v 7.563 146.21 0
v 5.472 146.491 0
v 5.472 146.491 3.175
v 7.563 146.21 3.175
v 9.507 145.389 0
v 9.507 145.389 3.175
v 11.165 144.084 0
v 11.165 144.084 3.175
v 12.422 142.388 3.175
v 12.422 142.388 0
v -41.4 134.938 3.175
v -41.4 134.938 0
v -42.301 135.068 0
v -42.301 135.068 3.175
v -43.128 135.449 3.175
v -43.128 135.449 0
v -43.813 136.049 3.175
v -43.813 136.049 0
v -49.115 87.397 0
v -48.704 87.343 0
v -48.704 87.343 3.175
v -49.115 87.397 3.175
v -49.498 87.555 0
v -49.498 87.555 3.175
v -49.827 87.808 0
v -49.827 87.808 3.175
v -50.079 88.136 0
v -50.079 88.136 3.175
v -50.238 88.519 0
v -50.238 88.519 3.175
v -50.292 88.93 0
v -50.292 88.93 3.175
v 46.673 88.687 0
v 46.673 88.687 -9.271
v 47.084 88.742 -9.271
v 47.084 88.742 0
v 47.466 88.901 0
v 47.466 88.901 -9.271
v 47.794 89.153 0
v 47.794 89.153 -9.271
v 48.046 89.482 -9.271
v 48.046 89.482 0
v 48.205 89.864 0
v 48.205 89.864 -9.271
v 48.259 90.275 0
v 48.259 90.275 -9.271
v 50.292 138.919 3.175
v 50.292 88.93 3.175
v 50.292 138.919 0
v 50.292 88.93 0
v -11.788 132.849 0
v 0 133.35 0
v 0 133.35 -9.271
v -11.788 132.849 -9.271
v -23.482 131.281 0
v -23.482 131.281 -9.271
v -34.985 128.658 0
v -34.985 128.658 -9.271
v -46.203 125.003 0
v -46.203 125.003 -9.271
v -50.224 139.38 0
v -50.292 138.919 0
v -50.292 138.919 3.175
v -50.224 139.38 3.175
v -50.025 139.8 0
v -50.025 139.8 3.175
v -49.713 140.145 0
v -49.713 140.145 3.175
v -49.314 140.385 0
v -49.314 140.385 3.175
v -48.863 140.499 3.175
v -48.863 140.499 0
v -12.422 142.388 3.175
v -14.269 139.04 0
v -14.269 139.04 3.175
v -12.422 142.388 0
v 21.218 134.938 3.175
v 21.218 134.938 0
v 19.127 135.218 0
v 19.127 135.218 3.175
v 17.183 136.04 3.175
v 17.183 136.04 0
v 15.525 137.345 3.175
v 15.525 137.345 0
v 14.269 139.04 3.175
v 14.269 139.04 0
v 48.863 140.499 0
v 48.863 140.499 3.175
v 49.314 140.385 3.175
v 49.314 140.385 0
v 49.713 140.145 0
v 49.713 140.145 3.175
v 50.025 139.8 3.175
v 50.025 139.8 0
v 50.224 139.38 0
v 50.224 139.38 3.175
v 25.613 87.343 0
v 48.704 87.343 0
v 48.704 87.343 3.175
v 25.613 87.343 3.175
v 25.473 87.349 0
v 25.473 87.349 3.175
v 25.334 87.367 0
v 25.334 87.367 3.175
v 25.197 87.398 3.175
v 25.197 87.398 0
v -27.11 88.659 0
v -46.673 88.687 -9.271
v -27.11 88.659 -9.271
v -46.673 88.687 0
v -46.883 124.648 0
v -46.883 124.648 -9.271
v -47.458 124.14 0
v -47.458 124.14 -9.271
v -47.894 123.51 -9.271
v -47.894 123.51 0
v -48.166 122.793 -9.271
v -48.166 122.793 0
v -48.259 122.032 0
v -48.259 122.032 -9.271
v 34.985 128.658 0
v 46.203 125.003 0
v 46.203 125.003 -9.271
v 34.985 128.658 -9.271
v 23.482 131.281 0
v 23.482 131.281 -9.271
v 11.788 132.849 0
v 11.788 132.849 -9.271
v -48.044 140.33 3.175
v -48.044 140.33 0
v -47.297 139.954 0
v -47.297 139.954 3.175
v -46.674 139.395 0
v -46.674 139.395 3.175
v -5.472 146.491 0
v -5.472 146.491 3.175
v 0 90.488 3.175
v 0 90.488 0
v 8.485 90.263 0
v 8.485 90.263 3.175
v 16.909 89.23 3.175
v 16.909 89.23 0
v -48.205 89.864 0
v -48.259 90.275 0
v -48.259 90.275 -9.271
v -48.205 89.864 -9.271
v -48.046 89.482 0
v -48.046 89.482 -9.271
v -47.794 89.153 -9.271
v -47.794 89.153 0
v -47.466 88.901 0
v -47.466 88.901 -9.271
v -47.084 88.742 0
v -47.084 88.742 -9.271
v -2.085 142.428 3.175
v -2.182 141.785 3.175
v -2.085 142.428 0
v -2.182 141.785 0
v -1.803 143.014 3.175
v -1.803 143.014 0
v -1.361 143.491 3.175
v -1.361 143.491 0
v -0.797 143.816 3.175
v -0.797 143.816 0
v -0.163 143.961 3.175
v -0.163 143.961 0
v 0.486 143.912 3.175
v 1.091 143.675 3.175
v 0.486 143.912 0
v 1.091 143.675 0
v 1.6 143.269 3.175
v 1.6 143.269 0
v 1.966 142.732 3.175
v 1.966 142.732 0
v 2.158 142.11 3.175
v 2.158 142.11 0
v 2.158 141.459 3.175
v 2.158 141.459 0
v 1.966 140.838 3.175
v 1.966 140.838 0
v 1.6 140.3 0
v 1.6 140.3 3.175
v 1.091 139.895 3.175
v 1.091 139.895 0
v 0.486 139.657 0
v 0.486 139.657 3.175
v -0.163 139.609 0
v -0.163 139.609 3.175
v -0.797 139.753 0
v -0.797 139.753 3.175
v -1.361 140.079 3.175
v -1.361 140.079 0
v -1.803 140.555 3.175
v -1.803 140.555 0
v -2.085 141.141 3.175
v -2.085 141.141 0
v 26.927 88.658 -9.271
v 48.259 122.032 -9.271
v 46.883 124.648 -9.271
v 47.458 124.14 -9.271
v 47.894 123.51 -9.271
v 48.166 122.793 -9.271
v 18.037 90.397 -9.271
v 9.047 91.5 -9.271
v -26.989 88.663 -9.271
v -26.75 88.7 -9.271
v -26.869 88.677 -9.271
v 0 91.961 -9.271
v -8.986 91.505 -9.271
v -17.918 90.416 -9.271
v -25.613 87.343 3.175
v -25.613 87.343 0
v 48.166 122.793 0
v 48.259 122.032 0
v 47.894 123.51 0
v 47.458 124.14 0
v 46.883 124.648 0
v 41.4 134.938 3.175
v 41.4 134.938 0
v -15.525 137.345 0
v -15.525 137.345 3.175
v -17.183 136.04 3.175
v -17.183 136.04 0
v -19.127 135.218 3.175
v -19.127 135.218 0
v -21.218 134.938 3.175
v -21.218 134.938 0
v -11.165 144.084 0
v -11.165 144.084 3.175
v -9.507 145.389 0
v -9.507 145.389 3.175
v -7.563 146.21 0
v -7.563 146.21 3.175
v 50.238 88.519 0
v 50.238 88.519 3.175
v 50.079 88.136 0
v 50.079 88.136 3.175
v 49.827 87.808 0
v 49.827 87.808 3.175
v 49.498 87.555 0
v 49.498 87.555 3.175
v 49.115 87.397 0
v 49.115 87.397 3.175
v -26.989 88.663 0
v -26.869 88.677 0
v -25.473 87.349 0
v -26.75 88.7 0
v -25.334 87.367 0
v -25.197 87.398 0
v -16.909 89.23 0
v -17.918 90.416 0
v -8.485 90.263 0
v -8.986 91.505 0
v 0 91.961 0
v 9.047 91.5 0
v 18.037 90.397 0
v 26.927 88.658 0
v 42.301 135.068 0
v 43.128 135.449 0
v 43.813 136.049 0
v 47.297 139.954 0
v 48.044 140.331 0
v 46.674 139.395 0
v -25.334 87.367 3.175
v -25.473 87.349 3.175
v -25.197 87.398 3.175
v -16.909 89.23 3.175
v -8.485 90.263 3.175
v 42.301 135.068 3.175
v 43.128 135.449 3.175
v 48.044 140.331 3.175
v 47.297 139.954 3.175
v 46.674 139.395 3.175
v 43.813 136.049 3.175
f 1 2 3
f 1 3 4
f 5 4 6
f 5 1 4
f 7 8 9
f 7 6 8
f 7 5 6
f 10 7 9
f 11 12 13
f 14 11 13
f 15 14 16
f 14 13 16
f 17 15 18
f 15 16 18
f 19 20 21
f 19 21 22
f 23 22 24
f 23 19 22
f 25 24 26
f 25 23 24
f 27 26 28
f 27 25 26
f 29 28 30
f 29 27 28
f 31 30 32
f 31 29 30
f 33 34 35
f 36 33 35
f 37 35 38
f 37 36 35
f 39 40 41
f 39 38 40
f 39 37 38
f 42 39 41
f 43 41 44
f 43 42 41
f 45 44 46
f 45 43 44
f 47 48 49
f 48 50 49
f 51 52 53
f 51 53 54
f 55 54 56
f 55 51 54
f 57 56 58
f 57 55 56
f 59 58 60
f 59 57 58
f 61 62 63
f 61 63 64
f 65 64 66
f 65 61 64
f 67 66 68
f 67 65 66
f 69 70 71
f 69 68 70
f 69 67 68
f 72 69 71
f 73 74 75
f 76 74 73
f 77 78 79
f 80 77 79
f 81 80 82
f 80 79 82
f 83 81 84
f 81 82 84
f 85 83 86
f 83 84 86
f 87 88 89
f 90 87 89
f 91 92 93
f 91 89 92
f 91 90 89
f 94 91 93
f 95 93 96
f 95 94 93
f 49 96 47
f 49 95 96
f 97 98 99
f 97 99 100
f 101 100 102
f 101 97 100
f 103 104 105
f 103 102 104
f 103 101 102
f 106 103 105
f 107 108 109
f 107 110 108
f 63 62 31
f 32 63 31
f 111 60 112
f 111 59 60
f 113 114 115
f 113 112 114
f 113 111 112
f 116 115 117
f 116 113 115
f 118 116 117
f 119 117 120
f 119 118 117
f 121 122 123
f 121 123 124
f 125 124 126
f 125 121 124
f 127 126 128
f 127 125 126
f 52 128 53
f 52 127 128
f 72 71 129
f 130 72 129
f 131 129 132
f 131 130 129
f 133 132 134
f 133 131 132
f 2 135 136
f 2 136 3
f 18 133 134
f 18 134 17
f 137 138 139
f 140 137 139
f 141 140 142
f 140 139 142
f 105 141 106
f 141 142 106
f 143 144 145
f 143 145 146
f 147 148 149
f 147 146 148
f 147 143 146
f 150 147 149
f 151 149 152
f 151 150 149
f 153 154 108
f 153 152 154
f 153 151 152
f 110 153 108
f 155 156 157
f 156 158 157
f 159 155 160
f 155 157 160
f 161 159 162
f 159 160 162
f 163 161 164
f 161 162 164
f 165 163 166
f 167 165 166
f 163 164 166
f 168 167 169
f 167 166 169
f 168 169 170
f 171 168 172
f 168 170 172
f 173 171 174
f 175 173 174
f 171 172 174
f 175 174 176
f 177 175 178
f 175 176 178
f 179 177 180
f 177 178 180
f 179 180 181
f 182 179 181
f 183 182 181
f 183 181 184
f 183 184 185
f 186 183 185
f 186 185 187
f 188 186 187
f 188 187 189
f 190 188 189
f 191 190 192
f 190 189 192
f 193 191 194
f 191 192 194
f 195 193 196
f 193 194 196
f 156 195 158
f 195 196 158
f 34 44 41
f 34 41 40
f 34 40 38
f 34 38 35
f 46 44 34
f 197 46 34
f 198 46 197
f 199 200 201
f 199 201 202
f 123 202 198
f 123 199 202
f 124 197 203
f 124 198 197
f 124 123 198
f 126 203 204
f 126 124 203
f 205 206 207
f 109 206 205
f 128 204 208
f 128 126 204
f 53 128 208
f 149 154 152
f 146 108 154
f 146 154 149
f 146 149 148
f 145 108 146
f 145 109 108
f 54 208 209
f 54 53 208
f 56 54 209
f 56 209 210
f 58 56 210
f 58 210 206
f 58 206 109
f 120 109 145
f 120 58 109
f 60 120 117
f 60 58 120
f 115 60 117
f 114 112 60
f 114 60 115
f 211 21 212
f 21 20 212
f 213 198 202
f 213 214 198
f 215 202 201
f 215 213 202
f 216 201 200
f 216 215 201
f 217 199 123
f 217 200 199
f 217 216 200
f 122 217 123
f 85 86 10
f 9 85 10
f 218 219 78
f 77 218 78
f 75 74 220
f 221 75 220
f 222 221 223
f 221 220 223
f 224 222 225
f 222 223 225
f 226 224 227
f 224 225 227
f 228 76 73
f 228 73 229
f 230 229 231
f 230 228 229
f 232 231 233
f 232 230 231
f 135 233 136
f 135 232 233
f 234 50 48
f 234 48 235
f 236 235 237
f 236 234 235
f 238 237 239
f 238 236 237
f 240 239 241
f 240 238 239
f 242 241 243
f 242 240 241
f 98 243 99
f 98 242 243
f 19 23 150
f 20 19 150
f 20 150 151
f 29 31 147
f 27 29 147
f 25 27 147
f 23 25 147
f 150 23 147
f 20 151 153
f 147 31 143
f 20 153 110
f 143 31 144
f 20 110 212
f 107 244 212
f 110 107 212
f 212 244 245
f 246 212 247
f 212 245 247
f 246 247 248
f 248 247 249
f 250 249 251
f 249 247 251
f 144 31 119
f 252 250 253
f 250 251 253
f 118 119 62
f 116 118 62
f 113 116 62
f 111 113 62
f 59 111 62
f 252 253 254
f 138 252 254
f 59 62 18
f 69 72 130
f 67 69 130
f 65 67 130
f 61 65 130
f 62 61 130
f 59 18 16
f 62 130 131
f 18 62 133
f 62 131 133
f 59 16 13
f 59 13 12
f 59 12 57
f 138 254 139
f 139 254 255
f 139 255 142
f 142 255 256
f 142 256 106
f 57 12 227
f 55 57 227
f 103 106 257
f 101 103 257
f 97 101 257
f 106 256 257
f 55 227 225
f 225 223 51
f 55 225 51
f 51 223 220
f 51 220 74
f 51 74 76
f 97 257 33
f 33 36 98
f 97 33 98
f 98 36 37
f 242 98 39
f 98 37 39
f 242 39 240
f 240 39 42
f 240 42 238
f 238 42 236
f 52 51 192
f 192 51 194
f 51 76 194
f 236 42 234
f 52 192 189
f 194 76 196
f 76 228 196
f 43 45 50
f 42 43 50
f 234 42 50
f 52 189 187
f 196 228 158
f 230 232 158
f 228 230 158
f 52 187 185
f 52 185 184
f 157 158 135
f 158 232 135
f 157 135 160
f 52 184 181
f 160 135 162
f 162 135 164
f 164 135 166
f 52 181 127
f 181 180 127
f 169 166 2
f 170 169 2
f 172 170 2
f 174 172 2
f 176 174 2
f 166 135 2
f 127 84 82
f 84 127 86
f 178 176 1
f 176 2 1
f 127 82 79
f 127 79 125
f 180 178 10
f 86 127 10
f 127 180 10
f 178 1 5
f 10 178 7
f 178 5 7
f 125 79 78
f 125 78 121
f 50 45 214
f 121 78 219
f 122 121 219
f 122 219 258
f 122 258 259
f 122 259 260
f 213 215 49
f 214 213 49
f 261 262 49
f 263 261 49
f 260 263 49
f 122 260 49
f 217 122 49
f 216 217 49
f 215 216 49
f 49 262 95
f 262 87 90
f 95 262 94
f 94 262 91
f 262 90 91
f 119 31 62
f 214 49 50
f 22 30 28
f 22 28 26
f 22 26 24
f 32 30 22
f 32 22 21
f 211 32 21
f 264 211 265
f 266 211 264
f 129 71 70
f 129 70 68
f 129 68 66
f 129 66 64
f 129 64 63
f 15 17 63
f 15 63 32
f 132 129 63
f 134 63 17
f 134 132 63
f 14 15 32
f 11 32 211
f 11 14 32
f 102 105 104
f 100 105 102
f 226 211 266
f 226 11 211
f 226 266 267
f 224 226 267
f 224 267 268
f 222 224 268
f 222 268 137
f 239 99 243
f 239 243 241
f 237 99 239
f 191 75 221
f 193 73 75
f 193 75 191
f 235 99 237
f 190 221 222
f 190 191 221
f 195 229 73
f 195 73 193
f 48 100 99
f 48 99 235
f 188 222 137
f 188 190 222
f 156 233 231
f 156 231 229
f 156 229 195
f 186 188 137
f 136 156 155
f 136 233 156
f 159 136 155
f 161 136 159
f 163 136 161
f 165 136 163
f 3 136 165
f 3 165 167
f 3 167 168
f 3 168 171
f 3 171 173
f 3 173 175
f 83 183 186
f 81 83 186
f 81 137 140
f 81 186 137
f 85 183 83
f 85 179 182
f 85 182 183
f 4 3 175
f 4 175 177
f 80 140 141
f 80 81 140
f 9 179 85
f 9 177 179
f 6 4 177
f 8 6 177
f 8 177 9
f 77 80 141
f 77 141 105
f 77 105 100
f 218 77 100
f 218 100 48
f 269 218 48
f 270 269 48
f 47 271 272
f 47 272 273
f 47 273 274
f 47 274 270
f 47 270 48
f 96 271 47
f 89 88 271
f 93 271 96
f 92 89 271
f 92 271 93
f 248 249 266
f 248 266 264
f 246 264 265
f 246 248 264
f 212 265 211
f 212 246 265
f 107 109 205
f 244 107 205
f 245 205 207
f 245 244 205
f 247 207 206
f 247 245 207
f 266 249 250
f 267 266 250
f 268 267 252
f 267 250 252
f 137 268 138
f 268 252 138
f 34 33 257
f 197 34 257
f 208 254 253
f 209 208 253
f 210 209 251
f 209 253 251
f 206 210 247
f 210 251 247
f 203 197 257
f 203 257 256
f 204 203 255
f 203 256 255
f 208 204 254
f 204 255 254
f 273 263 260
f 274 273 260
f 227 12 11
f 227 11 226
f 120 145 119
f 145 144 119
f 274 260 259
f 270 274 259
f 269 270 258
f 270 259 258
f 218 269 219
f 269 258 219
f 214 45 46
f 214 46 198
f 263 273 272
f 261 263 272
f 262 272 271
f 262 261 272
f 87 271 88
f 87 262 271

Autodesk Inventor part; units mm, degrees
ref_plane "YZ Plane" through (0, 0, 0) normal (1, 0, 0) x (0, 1, 0)
ref_plane "XZ Plane" through (0, 0, 0) normal (0, 1, 0) x (-1, 0, 0)
ref_plane "XY Plane" through (0, 0, 0) normal (0, 0, 1) x (1, 0, 0)
sketch "Esquisse1" plane through (0, 0, 0) normal (0, 0, 1) x (1, 0, 0)
  line L0 (-186.69, 0) -> (186.69, 0) projected
  line L1 (0, -197.485) -> (0, 251.46) projected
  circle A0 centre (0, 0) radius 133.35 construction
  line L2 (-50.292, 138.9194) -> (-50.292, 88.9302)
  line L3 (50.292, 88.9302) -> (50.292, 138.9194)
  line L4 (-5.4717, 146.4909) -> (0, 146.4909)
  line L5 (-59.3639, 174.3189) -> (62.2899, 174.3189) construction
  line L6 (62.2899, 174.3189) -> (62.2899, 74.4875) construction
  line L7 (62.2899, 74.4875) -> (-59.3639, 74.4875) construction
  line L8 (-59.3639, 74.4875) -> (-59.3639, 174.3189) construction
  line L9 (-46.6745, 139.3954) -> (-43.813, 136.0491)
  line L10 (-41.4, 134.9375) -> (-21.2184, 134.9375)
  line L11 (-14.2687, 139.0403) -> (-12.4215, 142.3881)
  line L12 (0, 14.2875) -> (0, 187.325) construction
  arc A1 (-46.6745, 139.3954) -> (-48.8631, 140.499) centre (-49.0875, 137.3319) ccw
  arc A2 (-43.813, 136.0491) -> (-41.4, 134.9375) centre (-41.4, 138.1125) ccw
  arc A3 (-48.8631, 140.499) -> (-50.292, 138.9194) centre (-48.7045, 138.9194) ccw
  arc A4 (-21.2184, 134.9375) -> (-14.2687, 139.0403) centre (-21.2184, 142.875) ccw
  arc A5 (-5.4717, 146.4909) -> (-12.4215, 142.3881) centre (-5.4717, 138.5534) ccw
  line L13 (5.4717, 146.4909) -> (0, 146.4909)
  line L14 (46.6745, 139.3954) -> (43.813, 136.0491)
  line L15 (41.4, 134.9375) -> (21.2184, 134.9375)
  line L16 (14.2687, 139.0403) -> (12.4215, 142.3881)
  arc A6 (48.8631, 140.499) -> (46.6745, 139.3954) centre (49.0875, 137.3319) ccw
  arc A7 (41.4, 134.9375) -> (43.813, 136.0491) centre (41.4, 138.1125) ccw
  arc A8 (50.292, 138.9194) -> (48.8631, 140.499) centre (48.7045, 138.9194) ccw
  arc A9 (14.2687, 139.0403) -> (21.2184, 134.9375) centre (21.2184, 142.875) ccw
  arc A10 (12.4215, 142.3881) -> (5.4717, 146.4909) centre (5.4717, 138.5534) ccw
  line L17 (-48.7045, 87.3427) -> (-25.6128, 87.3427)
  arc A11 (0, 90.4875) -> (-25.1966, 87.3982) centre (-1.8902, 1.6076) ccw
  arc A12 (-50.292, 88.9302) -> (-48.7045, 87.3427) centre (-48.7045, 88.9302) ccw
  arc A13 (-25.6128, 87.3427) -> (-25.1966, 87.3982) centre (-25.6128, 88.9302) ccw
  line L18 (48.7045, 87.3427) -> (25.6128, 87.3427)
  arc A14 (25.1966, 87.3982) -> (0, 90.4875) centre (1.8902, 1.6076) ccw
  arc A15 (25.1966, 87.3982) -> (25.6128, 87.3427) centre (25.6128, 88.9302) ccw
  arc A16 (48.7045, 87.3427) -> (50.292, 88.9302) centre (48.7045, 88.9302) ccw
  point P0 (-25.4, 87.3427)
  point P1 (48.7045, 87.3427)
  dimension "d0" = 266.7
  dimension "d1" = 100.584
  dimension "d37" = 121.6538
  dimension "d38" = 99.8314
  dimension "d39" = 74.4875
  dimension "d40" = 59.3639
  dimension "d52" = 3.175
  dimension "d55" = 1.5875
  dimension "d58" = 7.9375
  dimension "d67" = 88.9
  dimension "d68" = 1.5875
  dimension "d72" = 1.5875
extrude "Extrusion1" add sketch "Esquisse1" along normal blind 3.175
sketch "Esquisse2" plane through (0, 0, 0) normal (0, 0, -1) x (-1, 0, 0)
  line L0 (-50.292, 138.9194) -> (-50.292, 88.9302) projected
  line L1 (-21.2184, 134.9375) -> (-41.4, 134.9375) projected
  line L2 (-48.2586, 90.2748) -> (-48.2586, 122.0318)
  line L3 (-46.6734, 88.6873) -> (-26.9271, 88.6585)
  arc A0 (0, 91.9607) -> (-26.9271, 88.6585) centre (1.948, -35.3617) ccw
  arc A1 (0, 133.35) -> (-46.2034, 125.0028) centre (-0.3874, 3.4484) ccw
  line L4 (0, -197.485) -> (0, 251.46) projected
  line L5 (48.2586, 90.2748) -> (48.2586, 122.0318)
  line L6 (46.6734, 88.6873) -> (27.1101, 88.6588)
  arc A2 (26.75, 88.6996) -> (0, 91.9607) centre (-1.948, -35.3617) ccw
  arc A3 (46.2034, 125.0028) -> (0, 133.35) centre (0.3874, 3.4484) ccw
  arc A4 (-48.2586, 90.2748) -> (-46.6734, 88.6873) centre (-46.6711, 90.2748) ccw
  arc A5 (26.75, 88.6996) -> (27.1101, 88.6588) centre (27.1078, 90.2463) ccw
  arc A6 (46.6734, 88.6873) -> (48.2586, 90.2748) centre (46.6711, 90.2748) ccw
  arc A7 (-46.2034, 125.0028) -> (-48.2586, 122.0318) centre (-45.0836, 122.0318) ccw
  arc A8 (48.2586, 122.0318) -> (46.2034, 125.0028) centre (45.0836, 122.0318) ccw
  point P0 (0, 0)
  point P1 (-48.2586, 88.6897)
  point P2 (-48.2586, 124.2082)
  point P3 (48.2586, 88.6897)
  point P4 (48.2586, 124.2082)
  point P5 (26.9271, 88.6585)
  dimension "d80" = 1.5875
  dimension "d81" = 3.175
extrude "Extrusion2" add sketch "Esquisse2" along normal blind 9.271
sketch "Esquisse3" plane through (0, 0, 0) normal (0, 0, -1) x (-1, 0, 0)
  circle A0 centre (0, 141.7847) radius 2.1822
  point P0 (0, 0)
extrude "Extrusion3" cut sketch "Esquisse3" against normal blind 9.271
equation "\"d0\" = para_d"
equation "\"para_a\" = 25.4"
equation "\"para_b\" = 25.4"
equation "\"para_c\" = 25.4"
equation "\"para_d\" = 266.7"
equation "\"para_e\" = 25.4"
properties part number "BRAKE PAD" material "Acier"
